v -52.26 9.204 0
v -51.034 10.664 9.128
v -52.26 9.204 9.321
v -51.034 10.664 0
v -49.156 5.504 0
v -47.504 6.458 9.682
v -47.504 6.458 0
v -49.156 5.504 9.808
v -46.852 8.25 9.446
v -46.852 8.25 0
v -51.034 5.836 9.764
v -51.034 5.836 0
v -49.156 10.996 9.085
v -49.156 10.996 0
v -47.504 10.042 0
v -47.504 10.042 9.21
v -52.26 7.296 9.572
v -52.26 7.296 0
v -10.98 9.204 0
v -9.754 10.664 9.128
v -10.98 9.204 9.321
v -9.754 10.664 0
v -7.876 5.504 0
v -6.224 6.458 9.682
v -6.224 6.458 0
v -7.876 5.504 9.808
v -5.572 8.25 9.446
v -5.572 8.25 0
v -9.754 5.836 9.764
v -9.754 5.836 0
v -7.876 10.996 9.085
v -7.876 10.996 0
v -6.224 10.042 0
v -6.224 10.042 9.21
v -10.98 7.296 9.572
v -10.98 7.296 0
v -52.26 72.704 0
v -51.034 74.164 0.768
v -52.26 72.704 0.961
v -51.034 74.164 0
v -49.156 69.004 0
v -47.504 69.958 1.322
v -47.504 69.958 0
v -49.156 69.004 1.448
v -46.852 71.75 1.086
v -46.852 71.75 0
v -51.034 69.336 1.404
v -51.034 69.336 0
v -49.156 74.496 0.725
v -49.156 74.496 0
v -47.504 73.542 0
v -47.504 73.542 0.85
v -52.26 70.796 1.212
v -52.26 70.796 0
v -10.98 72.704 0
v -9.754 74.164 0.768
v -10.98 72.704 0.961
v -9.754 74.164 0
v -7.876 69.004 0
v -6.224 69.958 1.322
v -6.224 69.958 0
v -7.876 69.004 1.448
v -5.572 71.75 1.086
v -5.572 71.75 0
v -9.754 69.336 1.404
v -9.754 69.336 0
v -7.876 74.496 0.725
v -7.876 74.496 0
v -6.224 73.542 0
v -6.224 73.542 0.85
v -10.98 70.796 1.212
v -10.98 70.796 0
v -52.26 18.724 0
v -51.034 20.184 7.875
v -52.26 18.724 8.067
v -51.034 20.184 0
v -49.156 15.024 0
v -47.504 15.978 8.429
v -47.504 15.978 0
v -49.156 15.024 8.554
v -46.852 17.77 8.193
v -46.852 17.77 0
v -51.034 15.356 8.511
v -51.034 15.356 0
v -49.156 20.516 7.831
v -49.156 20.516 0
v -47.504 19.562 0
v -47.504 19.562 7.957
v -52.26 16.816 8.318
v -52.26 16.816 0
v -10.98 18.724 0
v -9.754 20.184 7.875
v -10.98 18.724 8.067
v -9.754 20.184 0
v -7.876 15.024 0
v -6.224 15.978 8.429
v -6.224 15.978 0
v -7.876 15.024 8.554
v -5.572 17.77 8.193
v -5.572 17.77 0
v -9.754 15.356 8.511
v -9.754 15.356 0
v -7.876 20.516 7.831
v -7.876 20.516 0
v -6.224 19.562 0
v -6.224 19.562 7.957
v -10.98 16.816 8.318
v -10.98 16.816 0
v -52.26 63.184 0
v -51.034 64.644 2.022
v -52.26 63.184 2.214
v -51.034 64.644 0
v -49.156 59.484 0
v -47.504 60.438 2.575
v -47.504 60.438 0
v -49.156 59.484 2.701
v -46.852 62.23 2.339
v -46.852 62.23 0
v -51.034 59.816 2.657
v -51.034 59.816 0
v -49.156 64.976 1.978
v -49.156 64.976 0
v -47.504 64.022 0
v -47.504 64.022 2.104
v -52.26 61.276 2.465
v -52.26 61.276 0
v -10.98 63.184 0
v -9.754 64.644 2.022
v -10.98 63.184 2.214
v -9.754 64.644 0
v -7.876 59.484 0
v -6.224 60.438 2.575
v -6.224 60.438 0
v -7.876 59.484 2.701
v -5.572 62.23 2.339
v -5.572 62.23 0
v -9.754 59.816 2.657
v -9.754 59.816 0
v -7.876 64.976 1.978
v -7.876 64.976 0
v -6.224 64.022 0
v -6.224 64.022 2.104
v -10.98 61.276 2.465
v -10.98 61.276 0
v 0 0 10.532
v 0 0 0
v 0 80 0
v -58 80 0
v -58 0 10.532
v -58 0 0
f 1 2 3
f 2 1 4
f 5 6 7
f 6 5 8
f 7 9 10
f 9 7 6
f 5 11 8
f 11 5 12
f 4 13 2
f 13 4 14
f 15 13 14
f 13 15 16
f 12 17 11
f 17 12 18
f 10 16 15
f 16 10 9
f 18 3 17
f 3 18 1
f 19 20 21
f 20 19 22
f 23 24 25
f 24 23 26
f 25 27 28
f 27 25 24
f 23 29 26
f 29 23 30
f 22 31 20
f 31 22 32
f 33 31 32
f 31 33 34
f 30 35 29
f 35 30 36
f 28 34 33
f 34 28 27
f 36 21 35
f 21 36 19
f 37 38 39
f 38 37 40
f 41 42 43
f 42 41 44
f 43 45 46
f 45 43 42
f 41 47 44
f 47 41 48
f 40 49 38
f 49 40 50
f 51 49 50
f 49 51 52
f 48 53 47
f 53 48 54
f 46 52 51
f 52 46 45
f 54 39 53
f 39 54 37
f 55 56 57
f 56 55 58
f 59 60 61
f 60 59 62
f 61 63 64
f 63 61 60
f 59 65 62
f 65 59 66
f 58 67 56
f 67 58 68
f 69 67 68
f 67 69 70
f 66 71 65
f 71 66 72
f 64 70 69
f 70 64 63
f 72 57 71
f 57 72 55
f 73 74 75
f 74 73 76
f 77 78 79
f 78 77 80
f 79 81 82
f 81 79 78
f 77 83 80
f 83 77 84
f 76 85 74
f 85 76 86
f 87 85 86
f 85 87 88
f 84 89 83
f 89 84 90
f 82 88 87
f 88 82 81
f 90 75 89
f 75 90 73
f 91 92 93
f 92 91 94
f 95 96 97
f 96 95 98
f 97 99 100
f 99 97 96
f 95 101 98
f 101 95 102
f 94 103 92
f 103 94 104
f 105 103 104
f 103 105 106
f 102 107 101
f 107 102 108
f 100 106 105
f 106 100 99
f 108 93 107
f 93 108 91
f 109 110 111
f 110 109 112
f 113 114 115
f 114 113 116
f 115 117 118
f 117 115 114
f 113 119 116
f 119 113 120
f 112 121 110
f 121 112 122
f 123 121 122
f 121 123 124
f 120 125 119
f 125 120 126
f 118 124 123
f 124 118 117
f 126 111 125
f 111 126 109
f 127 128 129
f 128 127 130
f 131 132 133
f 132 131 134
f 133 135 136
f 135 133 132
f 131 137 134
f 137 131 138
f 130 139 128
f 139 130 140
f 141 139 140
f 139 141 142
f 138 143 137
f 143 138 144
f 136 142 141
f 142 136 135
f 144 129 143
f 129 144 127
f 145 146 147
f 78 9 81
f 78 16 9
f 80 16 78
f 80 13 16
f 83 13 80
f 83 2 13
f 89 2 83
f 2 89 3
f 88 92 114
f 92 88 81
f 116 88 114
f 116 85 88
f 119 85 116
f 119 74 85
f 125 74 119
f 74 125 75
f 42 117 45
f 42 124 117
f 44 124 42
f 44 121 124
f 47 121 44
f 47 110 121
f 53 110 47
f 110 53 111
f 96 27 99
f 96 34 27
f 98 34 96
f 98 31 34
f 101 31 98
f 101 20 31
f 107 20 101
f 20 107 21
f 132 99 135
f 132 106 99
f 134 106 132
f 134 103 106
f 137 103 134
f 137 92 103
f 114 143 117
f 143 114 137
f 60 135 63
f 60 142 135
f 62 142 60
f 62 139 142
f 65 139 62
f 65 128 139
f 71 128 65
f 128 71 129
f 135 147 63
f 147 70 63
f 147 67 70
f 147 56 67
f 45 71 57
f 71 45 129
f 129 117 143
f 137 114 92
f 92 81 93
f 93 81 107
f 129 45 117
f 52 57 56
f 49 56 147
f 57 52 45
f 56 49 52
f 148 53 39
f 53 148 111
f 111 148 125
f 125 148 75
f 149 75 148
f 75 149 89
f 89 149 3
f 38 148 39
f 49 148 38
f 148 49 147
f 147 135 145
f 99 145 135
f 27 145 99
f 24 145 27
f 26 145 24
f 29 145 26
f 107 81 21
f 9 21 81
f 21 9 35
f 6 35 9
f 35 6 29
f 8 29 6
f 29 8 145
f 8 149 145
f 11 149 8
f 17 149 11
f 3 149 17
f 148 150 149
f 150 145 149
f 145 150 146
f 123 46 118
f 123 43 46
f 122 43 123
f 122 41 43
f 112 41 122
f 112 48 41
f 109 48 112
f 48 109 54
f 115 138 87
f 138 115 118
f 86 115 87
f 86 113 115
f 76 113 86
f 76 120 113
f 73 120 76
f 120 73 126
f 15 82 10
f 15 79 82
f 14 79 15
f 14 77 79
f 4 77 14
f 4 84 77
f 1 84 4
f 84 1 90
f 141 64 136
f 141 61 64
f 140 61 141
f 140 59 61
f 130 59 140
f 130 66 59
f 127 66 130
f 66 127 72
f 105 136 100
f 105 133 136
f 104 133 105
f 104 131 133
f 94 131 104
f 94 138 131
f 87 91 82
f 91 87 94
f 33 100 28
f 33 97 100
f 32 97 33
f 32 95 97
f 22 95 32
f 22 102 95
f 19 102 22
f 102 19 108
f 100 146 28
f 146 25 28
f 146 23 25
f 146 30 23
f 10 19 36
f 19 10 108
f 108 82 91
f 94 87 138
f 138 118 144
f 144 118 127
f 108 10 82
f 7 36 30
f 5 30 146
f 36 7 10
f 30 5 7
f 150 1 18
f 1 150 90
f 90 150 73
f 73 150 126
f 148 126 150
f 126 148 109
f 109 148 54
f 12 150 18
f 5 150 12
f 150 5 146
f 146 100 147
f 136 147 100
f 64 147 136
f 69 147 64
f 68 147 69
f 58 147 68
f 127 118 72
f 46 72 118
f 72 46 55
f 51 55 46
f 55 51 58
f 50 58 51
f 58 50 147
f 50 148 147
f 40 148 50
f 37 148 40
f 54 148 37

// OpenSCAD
// This makes the holes bigger.
tolerance = .3;
// This determines how thick the base of the riser will be in mm.
rise = 0; // [0:100]
// This Determines the angle of the wedge, between 0 and 45 degrees. Dont forget you can stack these too!
angle = 7.5; // [0:45]

// Copyright 2010 D1plo1d

// This library is dual licensed under the GPL 3.0 and the GNU Lesser General Public License as per http://creativecommons.org/licenses/LGPL/2.1/ .

//testNutsAndBolts();

module SKIPtestNutsAndBolts()
{
	$fn = 360;
	translate([0,15])nutHole(3, proj=2);
	boltHole(3, length= 30, proj=2);
}

MM = "mm";
INCH = "inch"; //Not yet supported

//Based on: http://www.roymech.co.uk/Useful_Tables/Screws/Hex_Screws.htm
METRIC_NUT_AC_WIDTHS =
[
	-1, //0 index is not used but reduces computation
	-1,
	-1,
	6.40,//m3
	8.10,//m4
	9.20,//m5
	11.50,//m6
	-1,
	15.00,//m8
	-1,
	19.60,//m10
	-1,
	22.10,//m12
	-1,
	-1,
	-1,
	27.70,//m16
	-1,
	-1,
	-1,
	34.60,//m20
	-1,
	-1,
	-1,
	41.60,//m24
	-1,
	-1,
	-1,
	-1,
	-1,
	53.1,//m30
	-1,
	-1,
	-1,
	-1,
	-1,
	63.5//m36
];
METRIC_NUT_THICKNESS =
[
	-1, //0 index is not used but reduces computation
	-1,
	-1,
	2.40,//m3
	3.20,//m4
	4.00,//m5
	5.00,//m6
	-1,
	6.50,//m8
	-1,
	8.00,//m10
	-1,
	10.00,//m12
	-1,
	-1,
	-1,
	13.00,//m16
	-1,
	-1,
	-1,
	16.00//m20
	-1,
	-1,
	-1,
	19.00,//m24
	-1,
	-1,
	-1,
	-1,
	-1,
	24.00,//m30
	-1,
	-1,
	-1,
	-1,
	-1,
	29.00//m36
];

COURSE_METRIC_BOLT_MAJOR_THREAD_DIAMETERS =
[//based on max values
	-1, //0 index is not used but reduces computation
	-1,
	-1,
	2.98,//m3
	3.978,//m4
	4.976,//m5
	5.974,//m6
	-1,
	7.972,//m8
	-1,
	9.968,//m10
	-1,
	11.966,//m12
	-1,
	-1,
	-1,
	15.962,//m16
	-1,
	-1,
	-1,
	19.958,//m20
	-1,
	-1,
	-1,
	23.952,//m24
	-1,
	-1,
	-1,
	-1,
	-1,
	29.947,//m30
	-1,
	-1,
	-1,
	-1,
	-1,
	35.940//m36
];

module nutHole(size, units=MM, tolerance = +0.0001, proj = -1)
{
	//takes a metric screw/nut size and looksup nut dimensions
	radius = METRIC_NUT_AC_WIDTHS[size]/2+tolerance;
	height = METRIC_NUT_THICKNESS[size]+tolerance;
	if (proj == -1)
	{
		cylinder(r= radius, h=height, $fn = 6, center=[0,0]);
	}
	if (proj == 1)
	{
		circle(r= radius, $fn = 6);
	}
	if (proj == 2)
	{
		translate([-radius/2, 0])
			square([radius*2, height]);
	}
}

module boltHole(size, units=MM, length, tolerance = +0.0001, proj = -1)
{
	radius = COURSE_METRIC_BOLT_MAJOR_THREAD_DIAMETERS[size]/2+tolerance;
//TODO: proper screw cap values
	capHeight = METRIC_NUT_THICKNESS[size]+tolerance; //METRIC_BOLT_CAP_HEIGHTS[size]+tolerance;
	capRadius = METRIC_NUT_AC_WIDTHS[size]/2+tolerance; //METRIC_BOLT_CAP_RADIUS[size]+tolerance;

	if (proj == -1)
	{
	translate([0, 0, -capHeight])
		cylinder(r= capRadius, h=capHeight);
	cylinder(r = radius, h = length);
	}
	if (proj == 1)
	{
		circle(r = radius);
	}
	if (proj == 2)
	{
		translate([-capRadius/2, -capHeight])
			square([capRadius*2, capHeight]);
		square([radius*2, length]);
	}
}



/* length, width of wedge
    height of side 1 and 2 
    drill oldschool and/or newschool pattern 
    bolt size (M)

    NOTE: if both oldschool and newschool bits are set to 1, 
    the newschool pattern will be displaced to match on one side.
*/
module wedge(len, wid, hei1, hei2, oldschool, newschool, bolt, angle1, derpschool) {

len = 80;
bolt_wid = 41.28;
new_len = 53.98;
old_len = 63.5;
angle1 = angle;
hei1 = tan(angle1)*len+rise;
hei2 = rise;

mx = len/2;
my = wid/2;

difference() {
  rotate([0,-90,0])
  linear_extrude(height=wid)
    polygon (points = [[0,0],[0,len],[hei2,len],[hei1,0]]);


/* for sunken holes you'll never need, 
   translate z by 
                     hei1 + (hei2-hei1)/len * (mx + x*mx*3/4) -0.5
*/

if (oldschool==1) {
  for (x = [-1,1])
  for (y = [-1,1]) 
  translate([-my + y * bolt_wid/2, mx + x * old_len/2, hei1+hei2 ])
  rotate([180,0,0])
  boltHole(bolt, length=hei1+hei2+0.1, tolerance=tolerance, 2);
}

if (newschool==1) {
  for (x = [-1,1])
  for (y = [-1,1]) 
  translate([-my + y * bolt_wid/2, mx + x * new_len/2 +(old_len-new_len)/2 * oldschool, hei1+hei2])
  rotate([180,0,0])
  boltHole(bolt, length=hei1+hei2+0.1, tolerance=tolerance, 2);
}
if (newschool==1) {
  for (x = [-1,1])
  for (y = [-1,1]) 
  translate([-my + y * bolt_wid/2, mx + x * new_len/2 -(old_len-new_len)/2 * oldschool, hei1+hei2])
  rotate([180,0,0])
  boltHole(bolt, length=hei1+hei2+0.1, tolerance=tolerance, 2);
}
}
}

/* example */
wedge (90, 58, 15, 10, 1, 1, 5);
/**/
